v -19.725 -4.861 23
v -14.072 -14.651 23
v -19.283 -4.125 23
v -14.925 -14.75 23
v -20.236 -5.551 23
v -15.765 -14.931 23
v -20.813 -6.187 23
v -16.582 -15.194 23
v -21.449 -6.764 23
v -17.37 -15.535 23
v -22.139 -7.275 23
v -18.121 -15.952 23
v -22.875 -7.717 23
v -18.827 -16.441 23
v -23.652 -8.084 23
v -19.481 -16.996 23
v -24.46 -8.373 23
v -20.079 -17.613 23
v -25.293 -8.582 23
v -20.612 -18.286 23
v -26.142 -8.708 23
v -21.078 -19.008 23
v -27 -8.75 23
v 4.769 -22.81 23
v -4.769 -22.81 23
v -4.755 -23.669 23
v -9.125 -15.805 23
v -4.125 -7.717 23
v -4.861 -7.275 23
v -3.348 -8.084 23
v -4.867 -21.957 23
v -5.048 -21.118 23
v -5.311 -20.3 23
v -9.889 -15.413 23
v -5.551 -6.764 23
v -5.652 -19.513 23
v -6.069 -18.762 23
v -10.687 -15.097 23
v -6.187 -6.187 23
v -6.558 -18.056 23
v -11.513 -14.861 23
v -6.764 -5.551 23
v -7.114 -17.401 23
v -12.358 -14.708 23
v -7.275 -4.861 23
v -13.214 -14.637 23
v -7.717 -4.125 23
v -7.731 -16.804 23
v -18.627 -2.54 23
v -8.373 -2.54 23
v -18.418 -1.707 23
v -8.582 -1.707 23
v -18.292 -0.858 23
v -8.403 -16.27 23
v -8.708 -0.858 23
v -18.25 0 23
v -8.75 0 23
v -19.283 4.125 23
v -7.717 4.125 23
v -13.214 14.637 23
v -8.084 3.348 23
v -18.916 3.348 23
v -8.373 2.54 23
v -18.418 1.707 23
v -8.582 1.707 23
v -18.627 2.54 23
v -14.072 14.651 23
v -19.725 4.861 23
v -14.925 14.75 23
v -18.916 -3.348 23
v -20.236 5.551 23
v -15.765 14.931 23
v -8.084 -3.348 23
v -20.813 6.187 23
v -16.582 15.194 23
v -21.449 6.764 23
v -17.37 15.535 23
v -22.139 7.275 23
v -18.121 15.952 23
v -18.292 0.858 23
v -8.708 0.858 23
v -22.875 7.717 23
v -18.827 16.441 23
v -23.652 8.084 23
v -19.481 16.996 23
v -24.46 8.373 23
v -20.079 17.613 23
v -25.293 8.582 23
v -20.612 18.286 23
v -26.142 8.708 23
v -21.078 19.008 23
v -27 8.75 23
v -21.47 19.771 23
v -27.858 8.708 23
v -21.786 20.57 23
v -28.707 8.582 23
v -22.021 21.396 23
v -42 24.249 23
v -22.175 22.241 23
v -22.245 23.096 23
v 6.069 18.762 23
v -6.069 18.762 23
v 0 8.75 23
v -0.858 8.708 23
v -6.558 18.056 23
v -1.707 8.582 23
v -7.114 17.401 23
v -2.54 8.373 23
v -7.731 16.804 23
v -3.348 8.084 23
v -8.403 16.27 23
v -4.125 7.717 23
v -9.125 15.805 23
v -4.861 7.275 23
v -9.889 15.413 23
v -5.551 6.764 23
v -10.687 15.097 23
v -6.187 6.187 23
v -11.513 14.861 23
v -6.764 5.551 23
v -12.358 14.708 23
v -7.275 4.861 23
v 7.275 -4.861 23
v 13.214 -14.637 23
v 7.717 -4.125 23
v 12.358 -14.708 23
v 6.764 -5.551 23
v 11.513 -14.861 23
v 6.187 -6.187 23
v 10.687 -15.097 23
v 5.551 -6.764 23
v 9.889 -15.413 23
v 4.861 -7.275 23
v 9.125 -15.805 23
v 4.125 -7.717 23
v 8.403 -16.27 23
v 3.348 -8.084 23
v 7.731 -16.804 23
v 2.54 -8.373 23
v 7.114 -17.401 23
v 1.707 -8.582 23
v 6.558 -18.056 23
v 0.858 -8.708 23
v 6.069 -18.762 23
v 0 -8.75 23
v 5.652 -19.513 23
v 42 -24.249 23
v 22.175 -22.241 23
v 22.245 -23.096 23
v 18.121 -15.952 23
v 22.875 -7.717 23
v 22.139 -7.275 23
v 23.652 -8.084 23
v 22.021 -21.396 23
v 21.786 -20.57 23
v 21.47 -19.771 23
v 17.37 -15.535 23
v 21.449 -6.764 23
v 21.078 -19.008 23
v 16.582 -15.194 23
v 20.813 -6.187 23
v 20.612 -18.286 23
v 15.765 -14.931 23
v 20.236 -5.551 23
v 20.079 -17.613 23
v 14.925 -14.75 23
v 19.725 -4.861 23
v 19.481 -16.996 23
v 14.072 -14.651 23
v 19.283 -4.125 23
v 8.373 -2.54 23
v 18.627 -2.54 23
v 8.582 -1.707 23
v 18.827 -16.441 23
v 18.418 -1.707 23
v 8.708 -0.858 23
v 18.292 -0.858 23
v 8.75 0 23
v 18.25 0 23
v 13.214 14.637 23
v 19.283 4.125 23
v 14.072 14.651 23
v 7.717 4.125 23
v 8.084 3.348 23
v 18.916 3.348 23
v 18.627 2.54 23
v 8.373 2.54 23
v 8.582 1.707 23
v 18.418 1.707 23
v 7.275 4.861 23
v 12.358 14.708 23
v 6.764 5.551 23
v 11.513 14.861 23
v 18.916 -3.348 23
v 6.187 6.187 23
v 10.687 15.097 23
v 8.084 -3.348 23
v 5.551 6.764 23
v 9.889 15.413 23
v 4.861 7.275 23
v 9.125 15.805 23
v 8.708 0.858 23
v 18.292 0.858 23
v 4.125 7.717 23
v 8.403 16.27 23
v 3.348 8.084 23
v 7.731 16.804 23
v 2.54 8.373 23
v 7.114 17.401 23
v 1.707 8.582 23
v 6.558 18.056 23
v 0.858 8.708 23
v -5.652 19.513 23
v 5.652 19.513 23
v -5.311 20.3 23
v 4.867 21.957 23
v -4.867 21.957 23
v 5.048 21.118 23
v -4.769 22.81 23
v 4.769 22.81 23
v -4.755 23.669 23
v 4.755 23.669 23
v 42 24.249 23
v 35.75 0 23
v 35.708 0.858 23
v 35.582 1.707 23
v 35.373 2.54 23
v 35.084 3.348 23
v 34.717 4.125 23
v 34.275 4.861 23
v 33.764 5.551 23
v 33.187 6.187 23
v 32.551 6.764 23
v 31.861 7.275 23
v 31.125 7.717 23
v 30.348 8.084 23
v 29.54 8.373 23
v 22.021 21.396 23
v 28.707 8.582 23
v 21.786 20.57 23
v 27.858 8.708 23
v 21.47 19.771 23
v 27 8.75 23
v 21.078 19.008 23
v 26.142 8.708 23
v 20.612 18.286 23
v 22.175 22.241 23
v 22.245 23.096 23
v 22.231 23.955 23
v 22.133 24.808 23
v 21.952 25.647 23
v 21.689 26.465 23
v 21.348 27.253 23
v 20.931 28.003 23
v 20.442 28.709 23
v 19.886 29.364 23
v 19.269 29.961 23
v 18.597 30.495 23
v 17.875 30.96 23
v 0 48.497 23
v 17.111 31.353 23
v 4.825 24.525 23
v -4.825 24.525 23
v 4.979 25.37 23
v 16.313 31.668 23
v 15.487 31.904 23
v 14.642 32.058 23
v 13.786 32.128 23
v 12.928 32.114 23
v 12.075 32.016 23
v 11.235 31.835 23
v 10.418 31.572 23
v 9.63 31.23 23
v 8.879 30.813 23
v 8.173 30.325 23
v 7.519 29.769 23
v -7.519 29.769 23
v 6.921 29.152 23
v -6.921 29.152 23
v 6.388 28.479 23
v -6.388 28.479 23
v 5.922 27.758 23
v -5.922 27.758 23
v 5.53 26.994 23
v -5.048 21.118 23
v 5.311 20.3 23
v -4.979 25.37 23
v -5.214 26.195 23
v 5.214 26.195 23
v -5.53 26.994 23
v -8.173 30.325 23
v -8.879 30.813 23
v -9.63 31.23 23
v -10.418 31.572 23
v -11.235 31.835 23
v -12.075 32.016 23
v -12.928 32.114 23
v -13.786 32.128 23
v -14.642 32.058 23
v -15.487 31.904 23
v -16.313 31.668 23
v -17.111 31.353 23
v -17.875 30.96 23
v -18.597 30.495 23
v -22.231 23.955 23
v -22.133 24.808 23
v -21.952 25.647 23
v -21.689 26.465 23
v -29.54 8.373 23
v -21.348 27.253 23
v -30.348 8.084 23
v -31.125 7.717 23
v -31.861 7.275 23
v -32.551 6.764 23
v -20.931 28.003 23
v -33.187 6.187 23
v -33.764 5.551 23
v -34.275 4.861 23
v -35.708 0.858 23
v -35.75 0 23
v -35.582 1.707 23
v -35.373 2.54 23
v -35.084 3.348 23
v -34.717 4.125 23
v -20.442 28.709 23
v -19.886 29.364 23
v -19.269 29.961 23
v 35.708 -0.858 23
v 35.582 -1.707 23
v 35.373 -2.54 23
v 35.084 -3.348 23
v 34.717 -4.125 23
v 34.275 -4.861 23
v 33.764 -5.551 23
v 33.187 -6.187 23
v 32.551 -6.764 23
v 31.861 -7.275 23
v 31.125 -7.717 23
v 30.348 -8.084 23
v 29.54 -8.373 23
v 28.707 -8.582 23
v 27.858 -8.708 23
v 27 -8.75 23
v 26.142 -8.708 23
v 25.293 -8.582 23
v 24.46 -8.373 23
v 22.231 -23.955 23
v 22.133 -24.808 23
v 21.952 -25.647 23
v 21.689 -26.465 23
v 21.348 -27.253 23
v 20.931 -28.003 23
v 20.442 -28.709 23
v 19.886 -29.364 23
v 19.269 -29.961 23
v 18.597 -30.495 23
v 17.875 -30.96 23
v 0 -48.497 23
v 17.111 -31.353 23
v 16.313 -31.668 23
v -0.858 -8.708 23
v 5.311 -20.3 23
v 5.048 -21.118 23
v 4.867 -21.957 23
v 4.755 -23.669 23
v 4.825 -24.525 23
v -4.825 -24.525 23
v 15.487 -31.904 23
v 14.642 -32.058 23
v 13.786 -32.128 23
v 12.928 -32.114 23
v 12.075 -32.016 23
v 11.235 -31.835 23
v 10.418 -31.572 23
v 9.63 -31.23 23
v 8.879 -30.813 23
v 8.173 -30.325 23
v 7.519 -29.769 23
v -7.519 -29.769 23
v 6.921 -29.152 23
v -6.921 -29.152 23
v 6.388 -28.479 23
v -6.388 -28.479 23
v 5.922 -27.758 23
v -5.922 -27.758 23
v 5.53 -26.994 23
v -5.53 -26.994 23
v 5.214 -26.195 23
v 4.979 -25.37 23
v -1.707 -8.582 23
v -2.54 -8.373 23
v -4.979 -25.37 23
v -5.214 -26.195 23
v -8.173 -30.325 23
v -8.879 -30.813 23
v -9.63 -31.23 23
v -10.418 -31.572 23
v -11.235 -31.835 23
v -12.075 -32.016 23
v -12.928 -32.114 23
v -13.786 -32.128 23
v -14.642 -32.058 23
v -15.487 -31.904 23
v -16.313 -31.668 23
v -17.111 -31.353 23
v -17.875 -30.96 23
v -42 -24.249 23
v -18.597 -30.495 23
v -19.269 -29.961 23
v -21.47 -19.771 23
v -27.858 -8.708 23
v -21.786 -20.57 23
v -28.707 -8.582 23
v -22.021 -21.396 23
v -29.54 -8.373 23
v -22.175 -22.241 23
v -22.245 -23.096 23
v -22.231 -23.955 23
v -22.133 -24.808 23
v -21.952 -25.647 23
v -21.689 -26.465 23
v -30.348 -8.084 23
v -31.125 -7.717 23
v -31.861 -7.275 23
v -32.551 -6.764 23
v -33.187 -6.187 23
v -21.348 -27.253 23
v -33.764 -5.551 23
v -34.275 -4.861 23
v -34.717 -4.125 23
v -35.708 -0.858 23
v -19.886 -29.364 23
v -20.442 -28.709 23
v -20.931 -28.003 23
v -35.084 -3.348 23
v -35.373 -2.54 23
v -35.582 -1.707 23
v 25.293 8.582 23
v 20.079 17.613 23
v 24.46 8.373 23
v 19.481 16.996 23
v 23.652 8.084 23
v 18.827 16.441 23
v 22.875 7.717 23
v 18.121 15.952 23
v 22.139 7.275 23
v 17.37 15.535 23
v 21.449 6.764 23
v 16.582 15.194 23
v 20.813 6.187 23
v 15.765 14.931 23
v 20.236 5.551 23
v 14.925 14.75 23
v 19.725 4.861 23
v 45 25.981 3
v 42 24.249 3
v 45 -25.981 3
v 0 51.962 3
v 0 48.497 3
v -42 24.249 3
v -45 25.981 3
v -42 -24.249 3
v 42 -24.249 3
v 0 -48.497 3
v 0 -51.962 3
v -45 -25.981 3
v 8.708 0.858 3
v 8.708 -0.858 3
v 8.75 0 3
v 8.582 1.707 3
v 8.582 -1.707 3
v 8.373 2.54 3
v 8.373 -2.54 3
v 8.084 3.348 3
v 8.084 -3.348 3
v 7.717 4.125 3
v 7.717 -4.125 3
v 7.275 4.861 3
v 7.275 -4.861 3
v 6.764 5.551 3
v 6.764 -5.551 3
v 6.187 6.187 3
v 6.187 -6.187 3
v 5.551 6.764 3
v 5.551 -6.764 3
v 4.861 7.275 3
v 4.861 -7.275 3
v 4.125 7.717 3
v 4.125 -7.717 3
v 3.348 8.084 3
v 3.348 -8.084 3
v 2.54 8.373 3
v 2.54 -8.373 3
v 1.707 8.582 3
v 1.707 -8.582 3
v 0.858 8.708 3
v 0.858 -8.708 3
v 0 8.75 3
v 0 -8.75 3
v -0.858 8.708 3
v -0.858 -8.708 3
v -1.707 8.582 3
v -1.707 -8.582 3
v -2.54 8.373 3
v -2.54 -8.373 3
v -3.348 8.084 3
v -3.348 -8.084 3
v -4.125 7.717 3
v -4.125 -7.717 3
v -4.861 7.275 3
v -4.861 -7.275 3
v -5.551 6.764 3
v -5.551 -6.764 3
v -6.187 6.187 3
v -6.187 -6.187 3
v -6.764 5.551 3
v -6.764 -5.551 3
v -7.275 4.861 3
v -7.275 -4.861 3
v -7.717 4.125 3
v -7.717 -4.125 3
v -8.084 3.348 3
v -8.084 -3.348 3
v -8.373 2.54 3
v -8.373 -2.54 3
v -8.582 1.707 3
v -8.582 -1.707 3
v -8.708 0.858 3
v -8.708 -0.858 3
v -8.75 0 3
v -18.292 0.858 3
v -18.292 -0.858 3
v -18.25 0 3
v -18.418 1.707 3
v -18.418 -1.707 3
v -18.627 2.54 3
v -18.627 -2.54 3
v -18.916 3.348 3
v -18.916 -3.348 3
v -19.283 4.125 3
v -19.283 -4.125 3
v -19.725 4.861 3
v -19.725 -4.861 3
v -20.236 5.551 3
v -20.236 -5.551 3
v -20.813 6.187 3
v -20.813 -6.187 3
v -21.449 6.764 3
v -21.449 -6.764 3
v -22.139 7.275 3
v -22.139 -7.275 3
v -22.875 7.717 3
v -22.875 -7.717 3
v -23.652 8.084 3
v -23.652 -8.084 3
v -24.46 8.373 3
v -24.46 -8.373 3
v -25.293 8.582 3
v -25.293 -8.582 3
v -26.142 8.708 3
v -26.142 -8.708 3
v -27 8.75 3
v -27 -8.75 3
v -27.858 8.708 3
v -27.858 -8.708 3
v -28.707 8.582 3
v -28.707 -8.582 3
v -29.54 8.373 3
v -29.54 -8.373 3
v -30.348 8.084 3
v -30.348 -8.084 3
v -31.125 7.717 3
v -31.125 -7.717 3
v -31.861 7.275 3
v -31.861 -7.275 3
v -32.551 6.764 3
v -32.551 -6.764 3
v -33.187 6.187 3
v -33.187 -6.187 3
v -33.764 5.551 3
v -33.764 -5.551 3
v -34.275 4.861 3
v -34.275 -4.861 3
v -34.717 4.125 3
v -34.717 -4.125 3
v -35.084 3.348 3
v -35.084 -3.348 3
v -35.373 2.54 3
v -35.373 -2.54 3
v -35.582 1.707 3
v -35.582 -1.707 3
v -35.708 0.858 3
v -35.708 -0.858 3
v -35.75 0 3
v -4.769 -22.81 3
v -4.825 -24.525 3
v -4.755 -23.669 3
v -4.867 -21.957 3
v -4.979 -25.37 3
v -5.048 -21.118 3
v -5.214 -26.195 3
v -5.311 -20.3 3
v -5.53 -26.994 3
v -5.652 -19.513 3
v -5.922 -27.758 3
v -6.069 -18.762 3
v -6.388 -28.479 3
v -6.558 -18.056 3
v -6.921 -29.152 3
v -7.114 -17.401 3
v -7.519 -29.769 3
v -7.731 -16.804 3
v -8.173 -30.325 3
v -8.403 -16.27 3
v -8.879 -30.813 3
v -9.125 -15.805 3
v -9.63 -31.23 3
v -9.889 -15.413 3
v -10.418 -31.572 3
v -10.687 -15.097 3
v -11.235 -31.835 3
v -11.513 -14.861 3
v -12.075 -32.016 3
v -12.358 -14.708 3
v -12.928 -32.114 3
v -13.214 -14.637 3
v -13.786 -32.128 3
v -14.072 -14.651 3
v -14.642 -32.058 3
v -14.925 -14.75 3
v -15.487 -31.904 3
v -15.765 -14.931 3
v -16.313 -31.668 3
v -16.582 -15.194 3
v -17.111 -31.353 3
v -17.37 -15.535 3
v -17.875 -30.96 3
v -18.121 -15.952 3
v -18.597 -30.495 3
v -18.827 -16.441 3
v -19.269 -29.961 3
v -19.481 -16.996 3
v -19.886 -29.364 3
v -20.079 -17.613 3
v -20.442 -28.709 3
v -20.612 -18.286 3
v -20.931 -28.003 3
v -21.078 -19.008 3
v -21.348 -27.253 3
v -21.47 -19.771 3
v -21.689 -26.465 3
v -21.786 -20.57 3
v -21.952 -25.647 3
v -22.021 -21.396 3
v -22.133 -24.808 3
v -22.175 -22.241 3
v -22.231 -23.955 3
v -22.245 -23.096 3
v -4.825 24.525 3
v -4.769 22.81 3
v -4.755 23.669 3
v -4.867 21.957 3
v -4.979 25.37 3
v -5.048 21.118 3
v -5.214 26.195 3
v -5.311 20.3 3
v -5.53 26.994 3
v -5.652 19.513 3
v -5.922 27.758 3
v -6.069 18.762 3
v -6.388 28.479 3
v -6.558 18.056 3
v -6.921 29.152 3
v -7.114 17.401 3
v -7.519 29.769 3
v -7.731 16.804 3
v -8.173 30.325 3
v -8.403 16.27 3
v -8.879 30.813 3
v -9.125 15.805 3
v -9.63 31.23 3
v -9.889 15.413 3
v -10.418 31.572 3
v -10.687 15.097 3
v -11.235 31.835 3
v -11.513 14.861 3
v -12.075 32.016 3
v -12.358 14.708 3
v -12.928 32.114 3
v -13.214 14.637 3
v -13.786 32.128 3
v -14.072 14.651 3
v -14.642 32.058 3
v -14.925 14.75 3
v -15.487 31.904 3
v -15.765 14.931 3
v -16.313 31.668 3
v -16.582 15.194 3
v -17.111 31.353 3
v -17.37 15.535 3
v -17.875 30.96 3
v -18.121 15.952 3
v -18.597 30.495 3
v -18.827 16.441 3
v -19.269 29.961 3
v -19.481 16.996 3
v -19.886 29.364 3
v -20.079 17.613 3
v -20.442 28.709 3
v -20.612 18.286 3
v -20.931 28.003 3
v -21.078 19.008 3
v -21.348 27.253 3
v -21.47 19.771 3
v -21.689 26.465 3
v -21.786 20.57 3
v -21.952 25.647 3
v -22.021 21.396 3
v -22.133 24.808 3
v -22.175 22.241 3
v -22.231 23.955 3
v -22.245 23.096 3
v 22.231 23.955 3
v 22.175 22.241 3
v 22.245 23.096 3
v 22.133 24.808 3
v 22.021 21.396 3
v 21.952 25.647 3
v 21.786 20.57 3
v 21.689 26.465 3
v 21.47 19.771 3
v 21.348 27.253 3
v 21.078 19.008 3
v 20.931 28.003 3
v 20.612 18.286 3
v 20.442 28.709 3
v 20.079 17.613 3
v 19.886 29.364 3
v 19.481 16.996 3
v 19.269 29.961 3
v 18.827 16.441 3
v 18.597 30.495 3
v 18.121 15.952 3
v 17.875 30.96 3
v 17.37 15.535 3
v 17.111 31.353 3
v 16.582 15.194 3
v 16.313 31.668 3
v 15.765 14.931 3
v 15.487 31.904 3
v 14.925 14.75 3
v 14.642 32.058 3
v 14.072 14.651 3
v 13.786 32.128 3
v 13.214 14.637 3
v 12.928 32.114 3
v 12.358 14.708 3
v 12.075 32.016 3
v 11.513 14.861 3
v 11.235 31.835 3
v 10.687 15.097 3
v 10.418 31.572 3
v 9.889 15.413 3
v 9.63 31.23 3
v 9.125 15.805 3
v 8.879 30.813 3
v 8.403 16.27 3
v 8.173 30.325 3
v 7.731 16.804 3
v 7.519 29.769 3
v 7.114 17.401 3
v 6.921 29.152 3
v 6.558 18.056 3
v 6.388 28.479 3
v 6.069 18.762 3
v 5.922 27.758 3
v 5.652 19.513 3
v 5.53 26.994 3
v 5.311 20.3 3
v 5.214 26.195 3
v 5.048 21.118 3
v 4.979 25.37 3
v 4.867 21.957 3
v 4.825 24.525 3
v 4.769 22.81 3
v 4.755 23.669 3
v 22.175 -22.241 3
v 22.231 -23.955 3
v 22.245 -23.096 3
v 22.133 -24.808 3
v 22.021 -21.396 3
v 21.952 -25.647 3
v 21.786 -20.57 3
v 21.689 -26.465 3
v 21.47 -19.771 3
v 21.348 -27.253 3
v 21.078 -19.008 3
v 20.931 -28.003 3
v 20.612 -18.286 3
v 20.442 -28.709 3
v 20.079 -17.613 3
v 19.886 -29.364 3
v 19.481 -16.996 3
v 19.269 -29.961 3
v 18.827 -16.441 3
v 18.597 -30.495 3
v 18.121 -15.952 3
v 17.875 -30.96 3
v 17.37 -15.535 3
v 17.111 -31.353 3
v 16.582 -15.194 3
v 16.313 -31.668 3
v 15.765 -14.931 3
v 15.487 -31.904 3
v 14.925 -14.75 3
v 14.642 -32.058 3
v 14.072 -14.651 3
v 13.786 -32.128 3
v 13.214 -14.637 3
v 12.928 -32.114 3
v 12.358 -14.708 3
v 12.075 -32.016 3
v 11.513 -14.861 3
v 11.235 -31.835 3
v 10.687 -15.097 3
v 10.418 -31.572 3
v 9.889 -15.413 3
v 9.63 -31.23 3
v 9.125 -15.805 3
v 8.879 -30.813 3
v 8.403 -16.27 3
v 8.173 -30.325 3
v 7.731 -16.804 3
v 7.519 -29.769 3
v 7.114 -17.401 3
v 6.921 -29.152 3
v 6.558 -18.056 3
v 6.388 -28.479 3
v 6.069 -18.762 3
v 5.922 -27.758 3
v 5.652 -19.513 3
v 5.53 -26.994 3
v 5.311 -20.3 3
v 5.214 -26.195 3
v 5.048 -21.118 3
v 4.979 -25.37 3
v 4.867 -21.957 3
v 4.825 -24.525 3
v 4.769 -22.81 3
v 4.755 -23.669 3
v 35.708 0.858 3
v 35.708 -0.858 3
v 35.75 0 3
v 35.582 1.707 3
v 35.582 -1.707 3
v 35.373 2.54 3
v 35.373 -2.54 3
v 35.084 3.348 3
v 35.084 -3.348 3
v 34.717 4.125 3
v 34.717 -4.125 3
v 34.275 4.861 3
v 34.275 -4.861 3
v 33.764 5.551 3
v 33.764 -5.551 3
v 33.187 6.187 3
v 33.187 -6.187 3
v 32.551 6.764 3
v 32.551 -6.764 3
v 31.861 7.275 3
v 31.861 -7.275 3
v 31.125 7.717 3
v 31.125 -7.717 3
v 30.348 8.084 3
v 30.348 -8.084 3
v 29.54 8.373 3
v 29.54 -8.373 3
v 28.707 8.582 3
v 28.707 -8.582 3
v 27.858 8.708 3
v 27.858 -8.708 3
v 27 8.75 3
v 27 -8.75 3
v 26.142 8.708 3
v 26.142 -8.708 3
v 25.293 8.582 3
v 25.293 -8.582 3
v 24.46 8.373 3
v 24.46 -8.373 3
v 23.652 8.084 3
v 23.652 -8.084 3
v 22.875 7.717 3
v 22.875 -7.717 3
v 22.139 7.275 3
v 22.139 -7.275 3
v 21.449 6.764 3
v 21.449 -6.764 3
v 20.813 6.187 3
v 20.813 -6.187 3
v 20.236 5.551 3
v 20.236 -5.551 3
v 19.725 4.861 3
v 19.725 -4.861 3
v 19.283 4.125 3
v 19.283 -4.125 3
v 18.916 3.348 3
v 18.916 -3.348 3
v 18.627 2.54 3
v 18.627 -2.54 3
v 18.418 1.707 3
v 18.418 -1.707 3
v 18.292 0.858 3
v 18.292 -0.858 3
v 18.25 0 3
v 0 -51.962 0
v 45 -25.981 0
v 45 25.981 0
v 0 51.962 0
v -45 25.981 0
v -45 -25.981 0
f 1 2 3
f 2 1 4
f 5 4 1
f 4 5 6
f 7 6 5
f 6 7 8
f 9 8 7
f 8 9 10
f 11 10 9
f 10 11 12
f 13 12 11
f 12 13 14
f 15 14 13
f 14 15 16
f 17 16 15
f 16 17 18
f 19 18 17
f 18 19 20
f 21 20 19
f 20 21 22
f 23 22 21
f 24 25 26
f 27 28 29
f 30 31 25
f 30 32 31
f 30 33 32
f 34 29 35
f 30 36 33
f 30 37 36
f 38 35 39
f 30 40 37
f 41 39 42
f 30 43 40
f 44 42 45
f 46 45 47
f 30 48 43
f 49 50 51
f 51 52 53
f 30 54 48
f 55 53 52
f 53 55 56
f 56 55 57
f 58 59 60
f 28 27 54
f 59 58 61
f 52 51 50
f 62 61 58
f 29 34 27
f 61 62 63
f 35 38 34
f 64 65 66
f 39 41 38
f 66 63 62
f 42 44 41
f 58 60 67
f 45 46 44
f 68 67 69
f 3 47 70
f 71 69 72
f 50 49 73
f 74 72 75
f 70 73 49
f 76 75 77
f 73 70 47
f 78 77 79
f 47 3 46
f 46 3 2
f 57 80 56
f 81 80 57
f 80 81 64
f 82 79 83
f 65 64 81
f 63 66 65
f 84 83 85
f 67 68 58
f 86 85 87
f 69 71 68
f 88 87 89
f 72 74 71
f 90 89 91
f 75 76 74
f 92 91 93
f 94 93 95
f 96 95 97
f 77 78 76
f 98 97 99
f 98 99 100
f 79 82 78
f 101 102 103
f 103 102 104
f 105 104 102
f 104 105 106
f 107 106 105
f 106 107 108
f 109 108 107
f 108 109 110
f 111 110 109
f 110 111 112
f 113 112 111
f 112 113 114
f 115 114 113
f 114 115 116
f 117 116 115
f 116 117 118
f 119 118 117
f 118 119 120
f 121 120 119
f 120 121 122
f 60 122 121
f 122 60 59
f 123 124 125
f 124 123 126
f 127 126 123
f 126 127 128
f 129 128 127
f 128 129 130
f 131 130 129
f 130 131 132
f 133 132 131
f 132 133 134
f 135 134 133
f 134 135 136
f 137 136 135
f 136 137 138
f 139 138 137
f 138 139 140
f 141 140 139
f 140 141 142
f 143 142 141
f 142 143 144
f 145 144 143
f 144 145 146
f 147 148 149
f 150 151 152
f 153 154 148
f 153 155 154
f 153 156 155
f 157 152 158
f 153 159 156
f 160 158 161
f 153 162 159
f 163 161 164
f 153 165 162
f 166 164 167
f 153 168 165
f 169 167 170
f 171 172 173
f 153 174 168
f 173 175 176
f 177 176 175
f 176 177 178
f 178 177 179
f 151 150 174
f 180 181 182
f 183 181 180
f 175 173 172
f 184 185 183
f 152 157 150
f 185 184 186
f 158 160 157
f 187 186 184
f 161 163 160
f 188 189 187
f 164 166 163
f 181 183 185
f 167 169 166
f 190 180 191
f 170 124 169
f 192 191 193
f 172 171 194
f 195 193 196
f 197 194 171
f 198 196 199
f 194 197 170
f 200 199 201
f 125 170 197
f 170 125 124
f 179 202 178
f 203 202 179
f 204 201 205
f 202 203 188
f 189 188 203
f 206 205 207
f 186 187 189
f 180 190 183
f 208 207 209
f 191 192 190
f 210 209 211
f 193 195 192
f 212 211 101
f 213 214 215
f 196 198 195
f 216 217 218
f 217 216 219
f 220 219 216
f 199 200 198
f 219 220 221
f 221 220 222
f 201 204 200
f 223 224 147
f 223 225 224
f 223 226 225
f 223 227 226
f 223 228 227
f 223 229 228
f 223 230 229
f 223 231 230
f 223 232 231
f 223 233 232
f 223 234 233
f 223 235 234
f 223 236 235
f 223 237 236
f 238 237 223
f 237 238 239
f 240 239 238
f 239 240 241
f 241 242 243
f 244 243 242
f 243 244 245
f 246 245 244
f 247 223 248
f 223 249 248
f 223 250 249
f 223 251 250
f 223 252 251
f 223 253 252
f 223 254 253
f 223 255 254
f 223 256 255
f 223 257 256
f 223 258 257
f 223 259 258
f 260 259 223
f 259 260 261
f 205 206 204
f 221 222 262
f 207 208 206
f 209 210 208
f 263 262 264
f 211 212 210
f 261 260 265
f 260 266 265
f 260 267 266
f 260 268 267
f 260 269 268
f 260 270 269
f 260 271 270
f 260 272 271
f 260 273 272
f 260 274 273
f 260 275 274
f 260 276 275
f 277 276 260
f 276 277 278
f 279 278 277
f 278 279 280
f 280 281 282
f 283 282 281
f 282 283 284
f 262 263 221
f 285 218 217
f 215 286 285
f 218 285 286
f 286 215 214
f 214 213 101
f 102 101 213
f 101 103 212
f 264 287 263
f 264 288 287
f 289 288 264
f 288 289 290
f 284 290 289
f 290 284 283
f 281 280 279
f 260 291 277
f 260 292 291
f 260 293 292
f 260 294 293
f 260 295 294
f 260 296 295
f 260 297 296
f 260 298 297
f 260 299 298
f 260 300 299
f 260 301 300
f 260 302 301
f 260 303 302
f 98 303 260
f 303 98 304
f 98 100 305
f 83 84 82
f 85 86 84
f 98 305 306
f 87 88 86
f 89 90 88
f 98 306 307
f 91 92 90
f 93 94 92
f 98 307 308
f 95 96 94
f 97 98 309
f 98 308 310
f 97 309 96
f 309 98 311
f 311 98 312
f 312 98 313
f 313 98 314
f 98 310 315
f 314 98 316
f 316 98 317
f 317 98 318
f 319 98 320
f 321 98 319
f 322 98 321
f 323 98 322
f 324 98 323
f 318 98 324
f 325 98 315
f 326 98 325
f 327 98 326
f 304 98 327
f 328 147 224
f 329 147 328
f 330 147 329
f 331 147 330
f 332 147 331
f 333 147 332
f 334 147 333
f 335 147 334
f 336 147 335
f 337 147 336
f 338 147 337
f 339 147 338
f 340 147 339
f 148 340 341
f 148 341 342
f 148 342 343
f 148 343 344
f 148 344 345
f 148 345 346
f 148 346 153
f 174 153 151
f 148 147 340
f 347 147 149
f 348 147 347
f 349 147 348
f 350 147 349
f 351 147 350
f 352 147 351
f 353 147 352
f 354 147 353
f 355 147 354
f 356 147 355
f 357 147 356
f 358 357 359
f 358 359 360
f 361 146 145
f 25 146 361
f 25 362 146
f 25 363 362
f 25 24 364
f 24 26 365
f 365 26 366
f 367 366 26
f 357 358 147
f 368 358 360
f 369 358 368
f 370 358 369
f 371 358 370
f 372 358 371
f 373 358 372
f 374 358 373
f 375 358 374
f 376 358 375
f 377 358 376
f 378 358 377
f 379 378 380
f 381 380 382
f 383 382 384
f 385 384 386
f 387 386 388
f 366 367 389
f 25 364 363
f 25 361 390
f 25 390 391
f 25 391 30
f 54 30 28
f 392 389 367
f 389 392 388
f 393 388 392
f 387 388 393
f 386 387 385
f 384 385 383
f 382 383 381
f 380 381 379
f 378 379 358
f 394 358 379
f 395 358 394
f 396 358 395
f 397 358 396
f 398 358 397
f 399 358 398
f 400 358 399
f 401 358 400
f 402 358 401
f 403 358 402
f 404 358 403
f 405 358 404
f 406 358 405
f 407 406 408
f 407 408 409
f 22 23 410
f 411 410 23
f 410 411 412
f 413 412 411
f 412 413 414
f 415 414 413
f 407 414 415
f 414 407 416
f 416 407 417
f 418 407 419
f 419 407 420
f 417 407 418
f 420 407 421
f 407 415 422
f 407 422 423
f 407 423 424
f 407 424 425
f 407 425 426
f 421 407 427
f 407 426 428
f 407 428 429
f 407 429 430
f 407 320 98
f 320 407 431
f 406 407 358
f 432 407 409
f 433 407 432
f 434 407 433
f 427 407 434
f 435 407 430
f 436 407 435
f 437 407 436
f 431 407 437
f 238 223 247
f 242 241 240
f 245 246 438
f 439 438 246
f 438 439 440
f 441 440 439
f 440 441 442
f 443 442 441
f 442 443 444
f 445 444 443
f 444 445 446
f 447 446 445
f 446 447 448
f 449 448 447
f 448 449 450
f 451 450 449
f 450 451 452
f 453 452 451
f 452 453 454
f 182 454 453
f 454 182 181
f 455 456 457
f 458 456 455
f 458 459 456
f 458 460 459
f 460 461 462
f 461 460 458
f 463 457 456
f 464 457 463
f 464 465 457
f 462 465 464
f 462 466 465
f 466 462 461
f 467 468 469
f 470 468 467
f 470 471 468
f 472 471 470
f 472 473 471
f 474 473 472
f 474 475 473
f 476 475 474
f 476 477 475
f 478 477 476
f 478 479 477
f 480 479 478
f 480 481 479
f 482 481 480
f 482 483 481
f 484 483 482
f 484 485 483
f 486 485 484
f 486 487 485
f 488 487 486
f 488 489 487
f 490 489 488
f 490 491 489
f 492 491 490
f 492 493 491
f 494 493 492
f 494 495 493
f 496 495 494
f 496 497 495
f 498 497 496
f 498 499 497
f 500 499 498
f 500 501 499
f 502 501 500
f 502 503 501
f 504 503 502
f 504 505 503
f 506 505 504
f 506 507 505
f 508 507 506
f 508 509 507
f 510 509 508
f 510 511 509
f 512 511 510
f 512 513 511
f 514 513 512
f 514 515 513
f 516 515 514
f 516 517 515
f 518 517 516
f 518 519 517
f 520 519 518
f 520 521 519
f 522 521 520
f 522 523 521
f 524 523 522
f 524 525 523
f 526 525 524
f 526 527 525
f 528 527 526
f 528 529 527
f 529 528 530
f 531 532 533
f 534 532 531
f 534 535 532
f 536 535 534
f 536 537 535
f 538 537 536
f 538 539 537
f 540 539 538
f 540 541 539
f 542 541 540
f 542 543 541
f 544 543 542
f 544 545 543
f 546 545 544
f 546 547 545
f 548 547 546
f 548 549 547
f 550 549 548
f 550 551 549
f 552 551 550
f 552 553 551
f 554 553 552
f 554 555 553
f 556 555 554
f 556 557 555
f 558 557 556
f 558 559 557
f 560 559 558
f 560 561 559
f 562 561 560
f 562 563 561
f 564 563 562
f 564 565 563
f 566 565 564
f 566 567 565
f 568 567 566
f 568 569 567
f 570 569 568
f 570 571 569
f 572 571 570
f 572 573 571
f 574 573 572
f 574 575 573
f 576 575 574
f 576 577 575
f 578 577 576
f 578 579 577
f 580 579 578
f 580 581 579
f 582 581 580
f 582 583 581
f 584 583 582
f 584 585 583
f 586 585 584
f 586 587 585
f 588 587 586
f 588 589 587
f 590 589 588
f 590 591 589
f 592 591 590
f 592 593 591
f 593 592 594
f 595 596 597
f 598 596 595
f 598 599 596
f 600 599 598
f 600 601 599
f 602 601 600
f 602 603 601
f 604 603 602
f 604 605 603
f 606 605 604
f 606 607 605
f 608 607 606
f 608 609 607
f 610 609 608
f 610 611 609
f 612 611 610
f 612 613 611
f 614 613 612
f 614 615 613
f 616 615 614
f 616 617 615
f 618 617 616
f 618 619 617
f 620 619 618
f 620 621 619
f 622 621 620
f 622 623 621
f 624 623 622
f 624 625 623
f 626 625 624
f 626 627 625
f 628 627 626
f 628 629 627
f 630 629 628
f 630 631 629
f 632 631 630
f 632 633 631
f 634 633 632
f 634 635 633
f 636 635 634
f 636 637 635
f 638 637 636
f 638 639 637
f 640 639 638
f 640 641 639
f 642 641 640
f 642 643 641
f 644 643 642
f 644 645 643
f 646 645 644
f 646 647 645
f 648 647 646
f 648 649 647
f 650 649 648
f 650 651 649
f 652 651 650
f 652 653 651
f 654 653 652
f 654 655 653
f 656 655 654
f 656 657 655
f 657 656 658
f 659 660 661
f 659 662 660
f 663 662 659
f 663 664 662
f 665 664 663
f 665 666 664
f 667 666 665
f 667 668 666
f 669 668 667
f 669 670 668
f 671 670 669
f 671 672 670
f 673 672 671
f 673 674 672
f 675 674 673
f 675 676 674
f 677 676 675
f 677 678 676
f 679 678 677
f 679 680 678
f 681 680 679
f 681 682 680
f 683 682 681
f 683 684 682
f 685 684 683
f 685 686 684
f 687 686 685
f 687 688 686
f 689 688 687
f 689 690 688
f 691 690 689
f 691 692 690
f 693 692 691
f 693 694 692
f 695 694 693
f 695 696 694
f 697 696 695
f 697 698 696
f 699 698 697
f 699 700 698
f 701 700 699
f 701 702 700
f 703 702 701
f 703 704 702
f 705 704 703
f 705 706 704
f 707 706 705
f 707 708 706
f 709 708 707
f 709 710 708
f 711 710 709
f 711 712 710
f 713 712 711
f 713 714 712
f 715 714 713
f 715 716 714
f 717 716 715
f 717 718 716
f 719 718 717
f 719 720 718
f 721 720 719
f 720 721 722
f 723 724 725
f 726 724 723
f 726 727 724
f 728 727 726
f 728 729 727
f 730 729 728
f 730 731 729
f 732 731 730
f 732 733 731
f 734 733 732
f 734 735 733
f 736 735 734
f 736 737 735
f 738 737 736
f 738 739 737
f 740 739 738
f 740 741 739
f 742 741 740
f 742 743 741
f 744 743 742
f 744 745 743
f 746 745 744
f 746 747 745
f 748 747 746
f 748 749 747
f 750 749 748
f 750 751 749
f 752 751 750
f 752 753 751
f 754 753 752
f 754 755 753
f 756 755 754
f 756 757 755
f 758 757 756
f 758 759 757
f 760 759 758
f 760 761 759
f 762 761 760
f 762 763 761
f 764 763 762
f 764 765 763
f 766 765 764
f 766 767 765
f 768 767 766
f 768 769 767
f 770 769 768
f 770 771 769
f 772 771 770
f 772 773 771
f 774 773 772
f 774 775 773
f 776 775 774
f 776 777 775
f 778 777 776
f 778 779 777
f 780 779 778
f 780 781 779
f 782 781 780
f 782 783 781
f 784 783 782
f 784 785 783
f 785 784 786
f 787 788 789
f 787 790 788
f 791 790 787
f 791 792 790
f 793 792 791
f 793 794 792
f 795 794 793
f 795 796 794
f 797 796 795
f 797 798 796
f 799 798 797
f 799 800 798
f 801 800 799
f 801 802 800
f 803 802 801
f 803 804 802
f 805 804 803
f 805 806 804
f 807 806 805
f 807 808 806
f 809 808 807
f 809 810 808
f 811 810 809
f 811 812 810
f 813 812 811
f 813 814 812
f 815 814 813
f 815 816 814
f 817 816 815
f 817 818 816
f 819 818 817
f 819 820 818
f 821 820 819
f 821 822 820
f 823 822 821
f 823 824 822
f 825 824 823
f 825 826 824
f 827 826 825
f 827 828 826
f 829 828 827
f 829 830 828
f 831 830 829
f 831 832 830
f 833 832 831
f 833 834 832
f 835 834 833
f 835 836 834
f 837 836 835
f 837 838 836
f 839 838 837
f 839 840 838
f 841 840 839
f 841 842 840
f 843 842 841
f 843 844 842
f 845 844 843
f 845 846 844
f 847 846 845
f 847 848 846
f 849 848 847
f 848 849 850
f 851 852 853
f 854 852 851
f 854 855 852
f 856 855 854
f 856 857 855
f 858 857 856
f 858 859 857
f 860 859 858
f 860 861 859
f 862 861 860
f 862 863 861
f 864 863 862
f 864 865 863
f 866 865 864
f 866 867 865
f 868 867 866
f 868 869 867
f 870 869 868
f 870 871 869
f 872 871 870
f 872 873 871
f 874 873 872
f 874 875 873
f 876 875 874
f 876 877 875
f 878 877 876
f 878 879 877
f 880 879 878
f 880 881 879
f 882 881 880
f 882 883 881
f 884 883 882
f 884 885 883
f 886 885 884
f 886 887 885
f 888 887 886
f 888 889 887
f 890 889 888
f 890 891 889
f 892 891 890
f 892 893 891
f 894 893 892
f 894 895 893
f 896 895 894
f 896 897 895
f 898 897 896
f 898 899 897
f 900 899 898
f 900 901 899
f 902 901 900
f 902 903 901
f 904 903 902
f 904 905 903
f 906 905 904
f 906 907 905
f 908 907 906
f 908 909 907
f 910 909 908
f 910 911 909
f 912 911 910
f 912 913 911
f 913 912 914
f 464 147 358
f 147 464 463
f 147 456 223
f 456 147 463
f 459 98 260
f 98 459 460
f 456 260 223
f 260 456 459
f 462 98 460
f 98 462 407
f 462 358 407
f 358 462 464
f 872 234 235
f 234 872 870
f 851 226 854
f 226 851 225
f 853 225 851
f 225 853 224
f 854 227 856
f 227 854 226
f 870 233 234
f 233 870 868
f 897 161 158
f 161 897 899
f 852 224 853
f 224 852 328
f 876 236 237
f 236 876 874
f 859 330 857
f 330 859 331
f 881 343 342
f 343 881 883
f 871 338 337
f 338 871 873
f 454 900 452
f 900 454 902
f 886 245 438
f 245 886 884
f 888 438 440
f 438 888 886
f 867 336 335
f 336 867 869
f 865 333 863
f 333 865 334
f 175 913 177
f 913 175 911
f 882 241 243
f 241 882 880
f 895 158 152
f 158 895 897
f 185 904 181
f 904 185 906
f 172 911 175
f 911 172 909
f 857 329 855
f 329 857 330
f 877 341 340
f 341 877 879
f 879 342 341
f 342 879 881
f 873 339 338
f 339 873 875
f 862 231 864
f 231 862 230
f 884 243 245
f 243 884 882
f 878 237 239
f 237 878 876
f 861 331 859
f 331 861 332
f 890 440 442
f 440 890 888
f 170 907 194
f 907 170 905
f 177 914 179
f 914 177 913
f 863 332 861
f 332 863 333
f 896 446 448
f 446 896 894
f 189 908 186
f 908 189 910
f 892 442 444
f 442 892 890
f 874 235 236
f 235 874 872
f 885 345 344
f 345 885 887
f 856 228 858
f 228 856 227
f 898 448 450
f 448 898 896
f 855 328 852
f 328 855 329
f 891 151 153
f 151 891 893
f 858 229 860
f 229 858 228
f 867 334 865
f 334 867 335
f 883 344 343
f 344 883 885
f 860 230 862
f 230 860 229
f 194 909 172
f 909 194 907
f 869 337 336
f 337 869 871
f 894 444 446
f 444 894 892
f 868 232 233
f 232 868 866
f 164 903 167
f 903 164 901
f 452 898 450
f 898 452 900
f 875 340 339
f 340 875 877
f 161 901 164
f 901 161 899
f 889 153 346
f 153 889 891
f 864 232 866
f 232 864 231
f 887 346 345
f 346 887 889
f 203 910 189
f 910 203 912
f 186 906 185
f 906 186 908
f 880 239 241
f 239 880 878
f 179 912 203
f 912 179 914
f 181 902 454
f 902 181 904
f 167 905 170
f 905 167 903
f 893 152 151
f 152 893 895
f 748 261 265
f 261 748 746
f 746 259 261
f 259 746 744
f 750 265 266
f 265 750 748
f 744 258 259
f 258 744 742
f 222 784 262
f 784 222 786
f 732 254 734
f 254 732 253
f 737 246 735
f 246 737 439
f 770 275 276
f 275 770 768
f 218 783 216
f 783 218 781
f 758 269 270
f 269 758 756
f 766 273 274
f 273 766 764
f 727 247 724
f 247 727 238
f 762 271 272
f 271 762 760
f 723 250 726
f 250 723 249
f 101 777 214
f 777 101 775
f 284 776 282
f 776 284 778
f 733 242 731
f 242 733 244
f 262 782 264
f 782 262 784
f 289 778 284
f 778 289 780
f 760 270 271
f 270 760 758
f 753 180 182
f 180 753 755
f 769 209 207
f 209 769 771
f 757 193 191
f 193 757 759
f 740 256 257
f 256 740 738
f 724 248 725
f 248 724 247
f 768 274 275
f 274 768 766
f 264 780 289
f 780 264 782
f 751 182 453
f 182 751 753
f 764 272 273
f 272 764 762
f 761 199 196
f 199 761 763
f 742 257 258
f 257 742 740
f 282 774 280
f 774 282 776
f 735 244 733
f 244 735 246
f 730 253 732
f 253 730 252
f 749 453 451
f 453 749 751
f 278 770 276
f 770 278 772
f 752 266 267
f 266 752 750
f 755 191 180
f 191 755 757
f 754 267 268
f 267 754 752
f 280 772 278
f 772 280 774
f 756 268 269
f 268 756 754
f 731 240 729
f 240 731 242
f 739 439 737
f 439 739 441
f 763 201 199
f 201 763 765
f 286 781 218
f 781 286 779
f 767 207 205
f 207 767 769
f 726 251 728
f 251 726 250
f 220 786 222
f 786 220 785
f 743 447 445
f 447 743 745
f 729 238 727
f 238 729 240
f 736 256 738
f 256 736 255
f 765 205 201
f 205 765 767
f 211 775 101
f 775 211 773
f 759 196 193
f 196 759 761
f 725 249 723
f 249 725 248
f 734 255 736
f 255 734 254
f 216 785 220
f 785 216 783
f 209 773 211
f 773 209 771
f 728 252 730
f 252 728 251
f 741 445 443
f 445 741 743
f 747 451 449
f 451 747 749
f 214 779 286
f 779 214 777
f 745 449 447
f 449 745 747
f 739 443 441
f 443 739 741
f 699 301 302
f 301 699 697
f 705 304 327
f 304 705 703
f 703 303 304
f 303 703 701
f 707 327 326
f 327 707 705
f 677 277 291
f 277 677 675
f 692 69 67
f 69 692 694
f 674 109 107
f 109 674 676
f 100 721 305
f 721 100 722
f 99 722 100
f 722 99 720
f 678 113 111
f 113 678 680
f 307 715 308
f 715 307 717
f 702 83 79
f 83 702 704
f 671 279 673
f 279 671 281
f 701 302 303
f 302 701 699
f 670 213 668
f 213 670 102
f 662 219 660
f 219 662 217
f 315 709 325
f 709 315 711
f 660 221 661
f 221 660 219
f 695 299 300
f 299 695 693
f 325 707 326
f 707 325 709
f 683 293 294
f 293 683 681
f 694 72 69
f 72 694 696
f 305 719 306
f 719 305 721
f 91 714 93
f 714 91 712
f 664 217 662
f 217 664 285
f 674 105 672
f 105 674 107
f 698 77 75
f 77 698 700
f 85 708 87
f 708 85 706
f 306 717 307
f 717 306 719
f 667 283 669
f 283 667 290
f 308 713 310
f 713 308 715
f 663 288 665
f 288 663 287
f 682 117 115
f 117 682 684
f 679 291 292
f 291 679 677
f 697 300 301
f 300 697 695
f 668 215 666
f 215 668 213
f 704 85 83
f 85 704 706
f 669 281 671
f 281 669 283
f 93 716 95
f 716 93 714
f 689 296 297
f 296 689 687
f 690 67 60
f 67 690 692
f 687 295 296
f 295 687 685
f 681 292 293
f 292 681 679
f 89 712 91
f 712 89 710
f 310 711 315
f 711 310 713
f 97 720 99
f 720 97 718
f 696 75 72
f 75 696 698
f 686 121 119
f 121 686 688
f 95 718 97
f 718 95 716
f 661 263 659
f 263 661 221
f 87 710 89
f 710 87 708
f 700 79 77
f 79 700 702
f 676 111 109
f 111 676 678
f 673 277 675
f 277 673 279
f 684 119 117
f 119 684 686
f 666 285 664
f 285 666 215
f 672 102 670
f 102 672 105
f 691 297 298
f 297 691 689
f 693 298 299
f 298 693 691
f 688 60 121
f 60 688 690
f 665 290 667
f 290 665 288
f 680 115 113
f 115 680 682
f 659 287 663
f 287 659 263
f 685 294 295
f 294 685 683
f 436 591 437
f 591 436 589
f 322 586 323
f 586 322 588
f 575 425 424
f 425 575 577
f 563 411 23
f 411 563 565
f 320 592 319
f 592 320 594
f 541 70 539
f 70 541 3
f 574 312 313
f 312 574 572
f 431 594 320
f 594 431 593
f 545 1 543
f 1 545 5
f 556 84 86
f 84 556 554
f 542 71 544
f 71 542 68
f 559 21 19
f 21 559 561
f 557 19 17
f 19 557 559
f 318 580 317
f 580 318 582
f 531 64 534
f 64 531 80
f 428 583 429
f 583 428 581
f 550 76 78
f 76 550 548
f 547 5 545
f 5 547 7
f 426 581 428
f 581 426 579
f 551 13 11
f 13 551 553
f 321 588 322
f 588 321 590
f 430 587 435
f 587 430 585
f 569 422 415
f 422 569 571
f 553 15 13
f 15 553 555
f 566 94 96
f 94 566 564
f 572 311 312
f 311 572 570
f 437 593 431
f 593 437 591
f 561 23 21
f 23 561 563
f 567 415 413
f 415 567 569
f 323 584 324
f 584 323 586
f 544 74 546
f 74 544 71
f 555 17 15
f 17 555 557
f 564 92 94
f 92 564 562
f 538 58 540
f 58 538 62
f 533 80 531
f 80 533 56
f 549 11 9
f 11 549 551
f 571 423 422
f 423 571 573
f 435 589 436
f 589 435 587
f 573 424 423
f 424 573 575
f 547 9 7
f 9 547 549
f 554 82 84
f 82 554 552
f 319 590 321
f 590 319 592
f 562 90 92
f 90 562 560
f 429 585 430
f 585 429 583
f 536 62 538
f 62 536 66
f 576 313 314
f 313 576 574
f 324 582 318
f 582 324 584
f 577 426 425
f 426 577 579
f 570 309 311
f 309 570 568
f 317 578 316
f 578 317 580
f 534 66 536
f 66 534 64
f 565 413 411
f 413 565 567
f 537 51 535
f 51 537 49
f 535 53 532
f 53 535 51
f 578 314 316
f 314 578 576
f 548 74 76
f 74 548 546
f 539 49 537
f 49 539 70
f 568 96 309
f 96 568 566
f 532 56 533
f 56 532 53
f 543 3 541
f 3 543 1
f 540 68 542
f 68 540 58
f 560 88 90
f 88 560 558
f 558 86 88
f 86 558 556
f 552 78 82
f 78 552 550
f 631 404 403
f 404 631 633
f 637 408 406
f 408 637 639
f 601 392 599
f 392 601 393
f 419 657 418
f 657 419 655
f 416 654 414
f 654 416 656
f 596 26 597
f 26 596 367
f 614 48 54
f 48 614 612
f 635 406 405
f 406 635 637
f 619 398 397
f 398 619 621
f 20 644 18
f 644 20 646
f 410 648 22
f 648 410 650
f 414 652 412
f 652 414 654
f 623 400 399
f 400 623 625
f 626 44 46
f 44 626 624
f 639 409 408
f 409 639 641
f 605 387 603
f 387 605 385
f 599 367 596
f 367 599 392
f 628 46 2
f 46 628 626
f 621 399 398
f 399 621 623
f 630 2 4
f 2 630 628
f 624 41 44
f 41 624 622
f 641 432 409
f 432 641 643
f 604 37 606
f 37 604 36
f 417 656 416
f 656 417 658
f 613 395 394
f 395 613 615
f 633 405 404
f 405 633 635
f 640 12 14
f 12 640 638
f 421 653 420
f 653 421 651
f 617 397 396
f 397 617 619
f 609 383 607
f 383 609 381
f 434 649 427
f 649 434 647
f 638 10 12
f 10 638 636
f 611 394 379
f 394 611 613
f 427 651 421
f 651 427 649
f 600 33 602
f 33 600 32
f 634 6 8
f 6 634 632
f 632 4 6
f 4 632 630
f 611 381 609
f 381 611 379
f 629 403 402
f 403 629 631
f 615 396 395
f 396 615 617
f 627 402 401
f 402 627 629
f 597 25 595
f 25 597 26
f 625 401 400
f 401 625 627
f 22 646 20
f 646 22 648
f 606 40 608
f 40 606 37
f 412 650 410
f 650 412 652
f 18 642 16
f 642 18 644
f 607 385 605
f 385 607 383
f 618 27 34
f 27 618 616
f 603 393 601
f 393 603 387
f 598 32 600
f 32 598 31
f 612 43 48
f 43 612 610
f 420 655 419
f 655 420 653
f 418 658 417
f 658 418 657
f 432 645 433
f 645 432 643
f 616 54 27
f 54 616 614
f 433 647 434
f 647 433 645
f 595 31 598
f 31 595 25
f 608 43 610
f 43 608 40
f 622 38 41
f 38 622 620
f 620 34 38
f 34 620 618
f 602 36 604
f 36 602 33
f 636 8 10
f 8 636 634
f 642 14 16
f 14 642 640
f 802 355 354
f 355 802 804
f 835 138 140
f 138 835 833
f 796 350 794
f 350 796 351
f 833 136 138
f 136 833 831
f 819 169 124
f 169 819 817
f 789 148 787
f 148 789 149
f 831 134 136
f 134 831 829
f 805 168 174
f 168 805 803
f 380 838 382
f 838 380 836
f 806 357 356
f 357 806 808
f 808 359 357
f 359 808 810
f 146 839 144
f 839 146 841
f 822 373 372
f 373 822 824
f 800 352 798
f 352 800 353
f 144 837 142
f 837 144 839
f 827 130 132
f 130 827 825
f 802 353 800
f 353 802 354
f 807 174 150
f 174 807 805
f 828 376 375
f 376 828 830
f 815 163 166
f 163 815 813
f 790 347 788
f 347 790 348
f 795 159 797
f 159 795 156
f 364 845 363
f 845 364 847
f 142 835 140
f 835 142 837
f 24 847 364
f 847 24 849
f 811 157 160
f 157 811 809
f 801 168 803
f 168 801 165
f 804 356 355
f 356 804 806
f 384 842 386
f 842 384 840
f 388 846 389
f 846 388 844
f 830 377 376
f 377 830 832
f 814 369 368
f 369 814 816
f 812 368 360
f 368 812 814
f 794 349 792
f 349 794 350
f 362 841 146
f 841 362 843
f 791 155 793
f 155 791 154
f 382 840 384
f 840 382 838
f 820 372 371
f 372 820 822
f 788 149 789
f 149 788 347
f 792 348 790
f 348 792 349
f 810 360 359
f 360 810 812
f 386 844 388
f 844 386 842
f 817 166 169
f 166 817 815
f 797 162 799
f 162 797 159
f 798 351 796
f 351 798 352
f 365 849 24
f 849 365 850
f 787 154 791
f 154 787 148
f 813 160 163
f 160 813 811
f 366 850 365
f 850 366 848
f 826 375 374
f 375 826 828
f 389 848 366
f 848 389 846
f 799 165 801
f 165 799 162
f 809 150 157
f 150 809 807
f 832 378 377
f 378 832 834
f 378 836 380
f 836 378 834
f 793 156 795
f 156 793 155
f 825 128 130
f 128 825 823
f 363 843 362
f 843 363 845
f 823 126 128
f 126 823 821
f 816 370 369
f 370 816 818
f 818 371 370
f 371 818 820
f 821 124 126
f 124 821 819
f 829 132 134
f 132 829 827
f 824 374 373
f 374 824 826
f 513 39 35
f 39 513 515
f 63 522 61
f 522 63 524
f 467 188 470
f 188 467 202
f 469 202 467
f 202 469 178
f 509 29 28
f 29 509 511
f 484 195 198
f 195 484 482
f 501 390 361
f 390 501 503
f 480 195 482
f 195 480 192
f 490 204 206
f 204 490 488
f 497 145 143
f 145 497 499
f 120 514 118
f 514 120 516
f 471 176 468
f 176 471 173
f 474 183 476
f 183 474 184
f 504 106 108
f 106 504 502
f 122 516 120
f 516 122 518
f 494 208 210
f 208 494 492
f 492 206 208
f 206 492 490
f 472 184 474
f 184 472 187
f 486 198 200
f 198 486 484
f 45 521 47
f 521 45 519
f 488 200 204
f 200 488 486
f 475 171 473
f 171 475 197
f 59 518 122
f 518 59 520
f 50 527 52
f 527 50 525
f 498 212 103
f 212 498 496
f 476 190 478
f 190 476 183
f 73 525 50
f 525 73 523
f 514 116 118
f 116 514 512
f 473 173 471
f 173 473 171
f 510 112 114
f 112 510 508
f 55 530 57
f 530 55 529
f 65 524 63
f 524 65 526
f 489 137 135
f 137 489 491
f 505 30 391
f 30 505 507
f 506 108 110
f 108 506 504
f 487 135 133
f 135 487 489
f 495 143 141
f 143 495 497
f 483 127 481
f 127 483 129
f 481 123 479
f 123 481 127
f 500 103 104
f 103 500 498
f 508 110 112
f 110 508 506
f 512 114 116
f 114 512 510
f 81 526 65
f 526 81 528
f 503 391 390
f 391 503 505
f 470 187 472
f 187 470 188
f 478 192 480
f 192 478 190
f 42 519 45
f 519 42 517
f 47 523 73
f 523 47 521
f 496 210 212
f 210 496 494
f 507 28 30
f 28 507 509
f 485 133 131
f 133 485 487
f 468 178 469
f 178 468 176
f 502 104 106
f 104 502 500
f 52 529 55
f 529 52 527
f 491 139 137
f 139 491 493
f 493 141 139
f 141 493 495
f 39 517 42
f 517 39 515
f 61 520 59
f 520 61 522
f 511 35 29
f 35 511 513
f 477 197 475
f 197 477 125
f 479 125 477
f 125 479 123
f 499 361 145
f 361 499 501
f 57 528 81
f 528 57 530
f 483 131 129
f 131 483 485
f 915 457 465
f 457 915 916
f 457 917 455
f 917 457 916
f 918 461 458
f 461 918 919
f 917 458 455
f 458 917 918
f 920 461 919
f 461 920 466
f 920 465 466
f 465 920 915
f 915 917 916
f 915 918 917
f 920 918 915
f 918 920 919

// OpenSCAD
// --- Dimensions ---
plate_thickness = 3;           // Thickness of the base plate
hexagon_across_flats = 90;      // Width of the hexagonal plate (flat-to-flat)
skirt_across_flats = 84;        // Width of the hexagonal skirt (flat-to-flat)
skirt_wall_thickness = 2;       // Thickness of the skirt wall
skirt_height = 20;              // Height of the skirt (from plate top)

hole_diameter = 17.5;           // Diameter of the conical tube holes
hole_spacing_diameter = 54;     // Diameter of the circle passing through hole centers
sleeve_outer_diameter = 21.5;   // Outside diameter of the sleeves
sleeve_height = 20;             // Height of the sleeves (from plate top)

// --- Constants ---
$fn = 64;

// --- Helper Modules ---

// Function to calculate the radius of a hexagon given the distance across flats
function hex_radius(across_flats) = (across_flats / 2) / cos(30);

// Module to create a hexagonal prism
// To ensure flats are parallel to X axis, we rotate 30 degrees.
module hexagon_prism(across_flats, height) {
    r = hex_radius(across_flats);
    rotate([0, 0, 30])
    cylinder(h = height, r = r, $fn = 6);
}

// --- Main Construction ---
// The part is built with the plate at Z=0. 
// The user will flip it for use so the skirt/sleeves trap air.

union() {
    // 1. The Base Plate
    // A hexagon with 90mm across flats.
    hexagon_prism(hexagon_across_flats, plate_thickness);

    // 2. The Sleeves and Skirt
    // We use a union for the positive features, then subtract the holes.
    difference() {
        union() {
            // The Hexagonal Skirt
            // Rises from the plate (z=3) to z=23.
            translate([0, 0, plate_thickness])
            hexagon_prism(skirt_across_flats, skirt_height);

            // The 7 Sleeves
            // Center sleeve
            translate([0, 0, plate_thickness])
            cylinder(h = sleeve_height, d = sleeve_outer_diameter);

            // 6 Peripheral sleeves
            for (i = [0 : 5]) {
                angle = i * 60;
                rotate([0, 0, angle])
                translate([hole_spacing_diameter / 2, 0, plate_thickness])
                cylinder(h = sleeve_height, d = sleeve_outer_diameter);
            }
        }

        // --- Subtraction: The Holes ---
        // Holes must pass through the plate AND the sleeves.
        // We extend the cylinders slightly to ensure clean cuts.
        
        // Center hole
        translate([0, 0, -0.01])
        cylinder(h = plate_thickness + sleeve_height + 0.02, d = hole_diameter);

        // Peripheral holes
        for (i = [0 : 5]) {
            angle = i * 60;
            rotate([0, 0, angle])
            translate([hole_spacing_diameter / 2, 0, -0.01])
            cylinder(h = plate_thickness + sleeve_height + 0.02, d = hole_diameter);
        }
    }
}

// Verification of geometry:
// Plate: Z=0 to 3.
// Skirt/Sleeves: Z=3 to 23.
// Total Height: 23mm.
// Hexagon orientation: 30 deg rotation ensures flats are parallel to X axis.
